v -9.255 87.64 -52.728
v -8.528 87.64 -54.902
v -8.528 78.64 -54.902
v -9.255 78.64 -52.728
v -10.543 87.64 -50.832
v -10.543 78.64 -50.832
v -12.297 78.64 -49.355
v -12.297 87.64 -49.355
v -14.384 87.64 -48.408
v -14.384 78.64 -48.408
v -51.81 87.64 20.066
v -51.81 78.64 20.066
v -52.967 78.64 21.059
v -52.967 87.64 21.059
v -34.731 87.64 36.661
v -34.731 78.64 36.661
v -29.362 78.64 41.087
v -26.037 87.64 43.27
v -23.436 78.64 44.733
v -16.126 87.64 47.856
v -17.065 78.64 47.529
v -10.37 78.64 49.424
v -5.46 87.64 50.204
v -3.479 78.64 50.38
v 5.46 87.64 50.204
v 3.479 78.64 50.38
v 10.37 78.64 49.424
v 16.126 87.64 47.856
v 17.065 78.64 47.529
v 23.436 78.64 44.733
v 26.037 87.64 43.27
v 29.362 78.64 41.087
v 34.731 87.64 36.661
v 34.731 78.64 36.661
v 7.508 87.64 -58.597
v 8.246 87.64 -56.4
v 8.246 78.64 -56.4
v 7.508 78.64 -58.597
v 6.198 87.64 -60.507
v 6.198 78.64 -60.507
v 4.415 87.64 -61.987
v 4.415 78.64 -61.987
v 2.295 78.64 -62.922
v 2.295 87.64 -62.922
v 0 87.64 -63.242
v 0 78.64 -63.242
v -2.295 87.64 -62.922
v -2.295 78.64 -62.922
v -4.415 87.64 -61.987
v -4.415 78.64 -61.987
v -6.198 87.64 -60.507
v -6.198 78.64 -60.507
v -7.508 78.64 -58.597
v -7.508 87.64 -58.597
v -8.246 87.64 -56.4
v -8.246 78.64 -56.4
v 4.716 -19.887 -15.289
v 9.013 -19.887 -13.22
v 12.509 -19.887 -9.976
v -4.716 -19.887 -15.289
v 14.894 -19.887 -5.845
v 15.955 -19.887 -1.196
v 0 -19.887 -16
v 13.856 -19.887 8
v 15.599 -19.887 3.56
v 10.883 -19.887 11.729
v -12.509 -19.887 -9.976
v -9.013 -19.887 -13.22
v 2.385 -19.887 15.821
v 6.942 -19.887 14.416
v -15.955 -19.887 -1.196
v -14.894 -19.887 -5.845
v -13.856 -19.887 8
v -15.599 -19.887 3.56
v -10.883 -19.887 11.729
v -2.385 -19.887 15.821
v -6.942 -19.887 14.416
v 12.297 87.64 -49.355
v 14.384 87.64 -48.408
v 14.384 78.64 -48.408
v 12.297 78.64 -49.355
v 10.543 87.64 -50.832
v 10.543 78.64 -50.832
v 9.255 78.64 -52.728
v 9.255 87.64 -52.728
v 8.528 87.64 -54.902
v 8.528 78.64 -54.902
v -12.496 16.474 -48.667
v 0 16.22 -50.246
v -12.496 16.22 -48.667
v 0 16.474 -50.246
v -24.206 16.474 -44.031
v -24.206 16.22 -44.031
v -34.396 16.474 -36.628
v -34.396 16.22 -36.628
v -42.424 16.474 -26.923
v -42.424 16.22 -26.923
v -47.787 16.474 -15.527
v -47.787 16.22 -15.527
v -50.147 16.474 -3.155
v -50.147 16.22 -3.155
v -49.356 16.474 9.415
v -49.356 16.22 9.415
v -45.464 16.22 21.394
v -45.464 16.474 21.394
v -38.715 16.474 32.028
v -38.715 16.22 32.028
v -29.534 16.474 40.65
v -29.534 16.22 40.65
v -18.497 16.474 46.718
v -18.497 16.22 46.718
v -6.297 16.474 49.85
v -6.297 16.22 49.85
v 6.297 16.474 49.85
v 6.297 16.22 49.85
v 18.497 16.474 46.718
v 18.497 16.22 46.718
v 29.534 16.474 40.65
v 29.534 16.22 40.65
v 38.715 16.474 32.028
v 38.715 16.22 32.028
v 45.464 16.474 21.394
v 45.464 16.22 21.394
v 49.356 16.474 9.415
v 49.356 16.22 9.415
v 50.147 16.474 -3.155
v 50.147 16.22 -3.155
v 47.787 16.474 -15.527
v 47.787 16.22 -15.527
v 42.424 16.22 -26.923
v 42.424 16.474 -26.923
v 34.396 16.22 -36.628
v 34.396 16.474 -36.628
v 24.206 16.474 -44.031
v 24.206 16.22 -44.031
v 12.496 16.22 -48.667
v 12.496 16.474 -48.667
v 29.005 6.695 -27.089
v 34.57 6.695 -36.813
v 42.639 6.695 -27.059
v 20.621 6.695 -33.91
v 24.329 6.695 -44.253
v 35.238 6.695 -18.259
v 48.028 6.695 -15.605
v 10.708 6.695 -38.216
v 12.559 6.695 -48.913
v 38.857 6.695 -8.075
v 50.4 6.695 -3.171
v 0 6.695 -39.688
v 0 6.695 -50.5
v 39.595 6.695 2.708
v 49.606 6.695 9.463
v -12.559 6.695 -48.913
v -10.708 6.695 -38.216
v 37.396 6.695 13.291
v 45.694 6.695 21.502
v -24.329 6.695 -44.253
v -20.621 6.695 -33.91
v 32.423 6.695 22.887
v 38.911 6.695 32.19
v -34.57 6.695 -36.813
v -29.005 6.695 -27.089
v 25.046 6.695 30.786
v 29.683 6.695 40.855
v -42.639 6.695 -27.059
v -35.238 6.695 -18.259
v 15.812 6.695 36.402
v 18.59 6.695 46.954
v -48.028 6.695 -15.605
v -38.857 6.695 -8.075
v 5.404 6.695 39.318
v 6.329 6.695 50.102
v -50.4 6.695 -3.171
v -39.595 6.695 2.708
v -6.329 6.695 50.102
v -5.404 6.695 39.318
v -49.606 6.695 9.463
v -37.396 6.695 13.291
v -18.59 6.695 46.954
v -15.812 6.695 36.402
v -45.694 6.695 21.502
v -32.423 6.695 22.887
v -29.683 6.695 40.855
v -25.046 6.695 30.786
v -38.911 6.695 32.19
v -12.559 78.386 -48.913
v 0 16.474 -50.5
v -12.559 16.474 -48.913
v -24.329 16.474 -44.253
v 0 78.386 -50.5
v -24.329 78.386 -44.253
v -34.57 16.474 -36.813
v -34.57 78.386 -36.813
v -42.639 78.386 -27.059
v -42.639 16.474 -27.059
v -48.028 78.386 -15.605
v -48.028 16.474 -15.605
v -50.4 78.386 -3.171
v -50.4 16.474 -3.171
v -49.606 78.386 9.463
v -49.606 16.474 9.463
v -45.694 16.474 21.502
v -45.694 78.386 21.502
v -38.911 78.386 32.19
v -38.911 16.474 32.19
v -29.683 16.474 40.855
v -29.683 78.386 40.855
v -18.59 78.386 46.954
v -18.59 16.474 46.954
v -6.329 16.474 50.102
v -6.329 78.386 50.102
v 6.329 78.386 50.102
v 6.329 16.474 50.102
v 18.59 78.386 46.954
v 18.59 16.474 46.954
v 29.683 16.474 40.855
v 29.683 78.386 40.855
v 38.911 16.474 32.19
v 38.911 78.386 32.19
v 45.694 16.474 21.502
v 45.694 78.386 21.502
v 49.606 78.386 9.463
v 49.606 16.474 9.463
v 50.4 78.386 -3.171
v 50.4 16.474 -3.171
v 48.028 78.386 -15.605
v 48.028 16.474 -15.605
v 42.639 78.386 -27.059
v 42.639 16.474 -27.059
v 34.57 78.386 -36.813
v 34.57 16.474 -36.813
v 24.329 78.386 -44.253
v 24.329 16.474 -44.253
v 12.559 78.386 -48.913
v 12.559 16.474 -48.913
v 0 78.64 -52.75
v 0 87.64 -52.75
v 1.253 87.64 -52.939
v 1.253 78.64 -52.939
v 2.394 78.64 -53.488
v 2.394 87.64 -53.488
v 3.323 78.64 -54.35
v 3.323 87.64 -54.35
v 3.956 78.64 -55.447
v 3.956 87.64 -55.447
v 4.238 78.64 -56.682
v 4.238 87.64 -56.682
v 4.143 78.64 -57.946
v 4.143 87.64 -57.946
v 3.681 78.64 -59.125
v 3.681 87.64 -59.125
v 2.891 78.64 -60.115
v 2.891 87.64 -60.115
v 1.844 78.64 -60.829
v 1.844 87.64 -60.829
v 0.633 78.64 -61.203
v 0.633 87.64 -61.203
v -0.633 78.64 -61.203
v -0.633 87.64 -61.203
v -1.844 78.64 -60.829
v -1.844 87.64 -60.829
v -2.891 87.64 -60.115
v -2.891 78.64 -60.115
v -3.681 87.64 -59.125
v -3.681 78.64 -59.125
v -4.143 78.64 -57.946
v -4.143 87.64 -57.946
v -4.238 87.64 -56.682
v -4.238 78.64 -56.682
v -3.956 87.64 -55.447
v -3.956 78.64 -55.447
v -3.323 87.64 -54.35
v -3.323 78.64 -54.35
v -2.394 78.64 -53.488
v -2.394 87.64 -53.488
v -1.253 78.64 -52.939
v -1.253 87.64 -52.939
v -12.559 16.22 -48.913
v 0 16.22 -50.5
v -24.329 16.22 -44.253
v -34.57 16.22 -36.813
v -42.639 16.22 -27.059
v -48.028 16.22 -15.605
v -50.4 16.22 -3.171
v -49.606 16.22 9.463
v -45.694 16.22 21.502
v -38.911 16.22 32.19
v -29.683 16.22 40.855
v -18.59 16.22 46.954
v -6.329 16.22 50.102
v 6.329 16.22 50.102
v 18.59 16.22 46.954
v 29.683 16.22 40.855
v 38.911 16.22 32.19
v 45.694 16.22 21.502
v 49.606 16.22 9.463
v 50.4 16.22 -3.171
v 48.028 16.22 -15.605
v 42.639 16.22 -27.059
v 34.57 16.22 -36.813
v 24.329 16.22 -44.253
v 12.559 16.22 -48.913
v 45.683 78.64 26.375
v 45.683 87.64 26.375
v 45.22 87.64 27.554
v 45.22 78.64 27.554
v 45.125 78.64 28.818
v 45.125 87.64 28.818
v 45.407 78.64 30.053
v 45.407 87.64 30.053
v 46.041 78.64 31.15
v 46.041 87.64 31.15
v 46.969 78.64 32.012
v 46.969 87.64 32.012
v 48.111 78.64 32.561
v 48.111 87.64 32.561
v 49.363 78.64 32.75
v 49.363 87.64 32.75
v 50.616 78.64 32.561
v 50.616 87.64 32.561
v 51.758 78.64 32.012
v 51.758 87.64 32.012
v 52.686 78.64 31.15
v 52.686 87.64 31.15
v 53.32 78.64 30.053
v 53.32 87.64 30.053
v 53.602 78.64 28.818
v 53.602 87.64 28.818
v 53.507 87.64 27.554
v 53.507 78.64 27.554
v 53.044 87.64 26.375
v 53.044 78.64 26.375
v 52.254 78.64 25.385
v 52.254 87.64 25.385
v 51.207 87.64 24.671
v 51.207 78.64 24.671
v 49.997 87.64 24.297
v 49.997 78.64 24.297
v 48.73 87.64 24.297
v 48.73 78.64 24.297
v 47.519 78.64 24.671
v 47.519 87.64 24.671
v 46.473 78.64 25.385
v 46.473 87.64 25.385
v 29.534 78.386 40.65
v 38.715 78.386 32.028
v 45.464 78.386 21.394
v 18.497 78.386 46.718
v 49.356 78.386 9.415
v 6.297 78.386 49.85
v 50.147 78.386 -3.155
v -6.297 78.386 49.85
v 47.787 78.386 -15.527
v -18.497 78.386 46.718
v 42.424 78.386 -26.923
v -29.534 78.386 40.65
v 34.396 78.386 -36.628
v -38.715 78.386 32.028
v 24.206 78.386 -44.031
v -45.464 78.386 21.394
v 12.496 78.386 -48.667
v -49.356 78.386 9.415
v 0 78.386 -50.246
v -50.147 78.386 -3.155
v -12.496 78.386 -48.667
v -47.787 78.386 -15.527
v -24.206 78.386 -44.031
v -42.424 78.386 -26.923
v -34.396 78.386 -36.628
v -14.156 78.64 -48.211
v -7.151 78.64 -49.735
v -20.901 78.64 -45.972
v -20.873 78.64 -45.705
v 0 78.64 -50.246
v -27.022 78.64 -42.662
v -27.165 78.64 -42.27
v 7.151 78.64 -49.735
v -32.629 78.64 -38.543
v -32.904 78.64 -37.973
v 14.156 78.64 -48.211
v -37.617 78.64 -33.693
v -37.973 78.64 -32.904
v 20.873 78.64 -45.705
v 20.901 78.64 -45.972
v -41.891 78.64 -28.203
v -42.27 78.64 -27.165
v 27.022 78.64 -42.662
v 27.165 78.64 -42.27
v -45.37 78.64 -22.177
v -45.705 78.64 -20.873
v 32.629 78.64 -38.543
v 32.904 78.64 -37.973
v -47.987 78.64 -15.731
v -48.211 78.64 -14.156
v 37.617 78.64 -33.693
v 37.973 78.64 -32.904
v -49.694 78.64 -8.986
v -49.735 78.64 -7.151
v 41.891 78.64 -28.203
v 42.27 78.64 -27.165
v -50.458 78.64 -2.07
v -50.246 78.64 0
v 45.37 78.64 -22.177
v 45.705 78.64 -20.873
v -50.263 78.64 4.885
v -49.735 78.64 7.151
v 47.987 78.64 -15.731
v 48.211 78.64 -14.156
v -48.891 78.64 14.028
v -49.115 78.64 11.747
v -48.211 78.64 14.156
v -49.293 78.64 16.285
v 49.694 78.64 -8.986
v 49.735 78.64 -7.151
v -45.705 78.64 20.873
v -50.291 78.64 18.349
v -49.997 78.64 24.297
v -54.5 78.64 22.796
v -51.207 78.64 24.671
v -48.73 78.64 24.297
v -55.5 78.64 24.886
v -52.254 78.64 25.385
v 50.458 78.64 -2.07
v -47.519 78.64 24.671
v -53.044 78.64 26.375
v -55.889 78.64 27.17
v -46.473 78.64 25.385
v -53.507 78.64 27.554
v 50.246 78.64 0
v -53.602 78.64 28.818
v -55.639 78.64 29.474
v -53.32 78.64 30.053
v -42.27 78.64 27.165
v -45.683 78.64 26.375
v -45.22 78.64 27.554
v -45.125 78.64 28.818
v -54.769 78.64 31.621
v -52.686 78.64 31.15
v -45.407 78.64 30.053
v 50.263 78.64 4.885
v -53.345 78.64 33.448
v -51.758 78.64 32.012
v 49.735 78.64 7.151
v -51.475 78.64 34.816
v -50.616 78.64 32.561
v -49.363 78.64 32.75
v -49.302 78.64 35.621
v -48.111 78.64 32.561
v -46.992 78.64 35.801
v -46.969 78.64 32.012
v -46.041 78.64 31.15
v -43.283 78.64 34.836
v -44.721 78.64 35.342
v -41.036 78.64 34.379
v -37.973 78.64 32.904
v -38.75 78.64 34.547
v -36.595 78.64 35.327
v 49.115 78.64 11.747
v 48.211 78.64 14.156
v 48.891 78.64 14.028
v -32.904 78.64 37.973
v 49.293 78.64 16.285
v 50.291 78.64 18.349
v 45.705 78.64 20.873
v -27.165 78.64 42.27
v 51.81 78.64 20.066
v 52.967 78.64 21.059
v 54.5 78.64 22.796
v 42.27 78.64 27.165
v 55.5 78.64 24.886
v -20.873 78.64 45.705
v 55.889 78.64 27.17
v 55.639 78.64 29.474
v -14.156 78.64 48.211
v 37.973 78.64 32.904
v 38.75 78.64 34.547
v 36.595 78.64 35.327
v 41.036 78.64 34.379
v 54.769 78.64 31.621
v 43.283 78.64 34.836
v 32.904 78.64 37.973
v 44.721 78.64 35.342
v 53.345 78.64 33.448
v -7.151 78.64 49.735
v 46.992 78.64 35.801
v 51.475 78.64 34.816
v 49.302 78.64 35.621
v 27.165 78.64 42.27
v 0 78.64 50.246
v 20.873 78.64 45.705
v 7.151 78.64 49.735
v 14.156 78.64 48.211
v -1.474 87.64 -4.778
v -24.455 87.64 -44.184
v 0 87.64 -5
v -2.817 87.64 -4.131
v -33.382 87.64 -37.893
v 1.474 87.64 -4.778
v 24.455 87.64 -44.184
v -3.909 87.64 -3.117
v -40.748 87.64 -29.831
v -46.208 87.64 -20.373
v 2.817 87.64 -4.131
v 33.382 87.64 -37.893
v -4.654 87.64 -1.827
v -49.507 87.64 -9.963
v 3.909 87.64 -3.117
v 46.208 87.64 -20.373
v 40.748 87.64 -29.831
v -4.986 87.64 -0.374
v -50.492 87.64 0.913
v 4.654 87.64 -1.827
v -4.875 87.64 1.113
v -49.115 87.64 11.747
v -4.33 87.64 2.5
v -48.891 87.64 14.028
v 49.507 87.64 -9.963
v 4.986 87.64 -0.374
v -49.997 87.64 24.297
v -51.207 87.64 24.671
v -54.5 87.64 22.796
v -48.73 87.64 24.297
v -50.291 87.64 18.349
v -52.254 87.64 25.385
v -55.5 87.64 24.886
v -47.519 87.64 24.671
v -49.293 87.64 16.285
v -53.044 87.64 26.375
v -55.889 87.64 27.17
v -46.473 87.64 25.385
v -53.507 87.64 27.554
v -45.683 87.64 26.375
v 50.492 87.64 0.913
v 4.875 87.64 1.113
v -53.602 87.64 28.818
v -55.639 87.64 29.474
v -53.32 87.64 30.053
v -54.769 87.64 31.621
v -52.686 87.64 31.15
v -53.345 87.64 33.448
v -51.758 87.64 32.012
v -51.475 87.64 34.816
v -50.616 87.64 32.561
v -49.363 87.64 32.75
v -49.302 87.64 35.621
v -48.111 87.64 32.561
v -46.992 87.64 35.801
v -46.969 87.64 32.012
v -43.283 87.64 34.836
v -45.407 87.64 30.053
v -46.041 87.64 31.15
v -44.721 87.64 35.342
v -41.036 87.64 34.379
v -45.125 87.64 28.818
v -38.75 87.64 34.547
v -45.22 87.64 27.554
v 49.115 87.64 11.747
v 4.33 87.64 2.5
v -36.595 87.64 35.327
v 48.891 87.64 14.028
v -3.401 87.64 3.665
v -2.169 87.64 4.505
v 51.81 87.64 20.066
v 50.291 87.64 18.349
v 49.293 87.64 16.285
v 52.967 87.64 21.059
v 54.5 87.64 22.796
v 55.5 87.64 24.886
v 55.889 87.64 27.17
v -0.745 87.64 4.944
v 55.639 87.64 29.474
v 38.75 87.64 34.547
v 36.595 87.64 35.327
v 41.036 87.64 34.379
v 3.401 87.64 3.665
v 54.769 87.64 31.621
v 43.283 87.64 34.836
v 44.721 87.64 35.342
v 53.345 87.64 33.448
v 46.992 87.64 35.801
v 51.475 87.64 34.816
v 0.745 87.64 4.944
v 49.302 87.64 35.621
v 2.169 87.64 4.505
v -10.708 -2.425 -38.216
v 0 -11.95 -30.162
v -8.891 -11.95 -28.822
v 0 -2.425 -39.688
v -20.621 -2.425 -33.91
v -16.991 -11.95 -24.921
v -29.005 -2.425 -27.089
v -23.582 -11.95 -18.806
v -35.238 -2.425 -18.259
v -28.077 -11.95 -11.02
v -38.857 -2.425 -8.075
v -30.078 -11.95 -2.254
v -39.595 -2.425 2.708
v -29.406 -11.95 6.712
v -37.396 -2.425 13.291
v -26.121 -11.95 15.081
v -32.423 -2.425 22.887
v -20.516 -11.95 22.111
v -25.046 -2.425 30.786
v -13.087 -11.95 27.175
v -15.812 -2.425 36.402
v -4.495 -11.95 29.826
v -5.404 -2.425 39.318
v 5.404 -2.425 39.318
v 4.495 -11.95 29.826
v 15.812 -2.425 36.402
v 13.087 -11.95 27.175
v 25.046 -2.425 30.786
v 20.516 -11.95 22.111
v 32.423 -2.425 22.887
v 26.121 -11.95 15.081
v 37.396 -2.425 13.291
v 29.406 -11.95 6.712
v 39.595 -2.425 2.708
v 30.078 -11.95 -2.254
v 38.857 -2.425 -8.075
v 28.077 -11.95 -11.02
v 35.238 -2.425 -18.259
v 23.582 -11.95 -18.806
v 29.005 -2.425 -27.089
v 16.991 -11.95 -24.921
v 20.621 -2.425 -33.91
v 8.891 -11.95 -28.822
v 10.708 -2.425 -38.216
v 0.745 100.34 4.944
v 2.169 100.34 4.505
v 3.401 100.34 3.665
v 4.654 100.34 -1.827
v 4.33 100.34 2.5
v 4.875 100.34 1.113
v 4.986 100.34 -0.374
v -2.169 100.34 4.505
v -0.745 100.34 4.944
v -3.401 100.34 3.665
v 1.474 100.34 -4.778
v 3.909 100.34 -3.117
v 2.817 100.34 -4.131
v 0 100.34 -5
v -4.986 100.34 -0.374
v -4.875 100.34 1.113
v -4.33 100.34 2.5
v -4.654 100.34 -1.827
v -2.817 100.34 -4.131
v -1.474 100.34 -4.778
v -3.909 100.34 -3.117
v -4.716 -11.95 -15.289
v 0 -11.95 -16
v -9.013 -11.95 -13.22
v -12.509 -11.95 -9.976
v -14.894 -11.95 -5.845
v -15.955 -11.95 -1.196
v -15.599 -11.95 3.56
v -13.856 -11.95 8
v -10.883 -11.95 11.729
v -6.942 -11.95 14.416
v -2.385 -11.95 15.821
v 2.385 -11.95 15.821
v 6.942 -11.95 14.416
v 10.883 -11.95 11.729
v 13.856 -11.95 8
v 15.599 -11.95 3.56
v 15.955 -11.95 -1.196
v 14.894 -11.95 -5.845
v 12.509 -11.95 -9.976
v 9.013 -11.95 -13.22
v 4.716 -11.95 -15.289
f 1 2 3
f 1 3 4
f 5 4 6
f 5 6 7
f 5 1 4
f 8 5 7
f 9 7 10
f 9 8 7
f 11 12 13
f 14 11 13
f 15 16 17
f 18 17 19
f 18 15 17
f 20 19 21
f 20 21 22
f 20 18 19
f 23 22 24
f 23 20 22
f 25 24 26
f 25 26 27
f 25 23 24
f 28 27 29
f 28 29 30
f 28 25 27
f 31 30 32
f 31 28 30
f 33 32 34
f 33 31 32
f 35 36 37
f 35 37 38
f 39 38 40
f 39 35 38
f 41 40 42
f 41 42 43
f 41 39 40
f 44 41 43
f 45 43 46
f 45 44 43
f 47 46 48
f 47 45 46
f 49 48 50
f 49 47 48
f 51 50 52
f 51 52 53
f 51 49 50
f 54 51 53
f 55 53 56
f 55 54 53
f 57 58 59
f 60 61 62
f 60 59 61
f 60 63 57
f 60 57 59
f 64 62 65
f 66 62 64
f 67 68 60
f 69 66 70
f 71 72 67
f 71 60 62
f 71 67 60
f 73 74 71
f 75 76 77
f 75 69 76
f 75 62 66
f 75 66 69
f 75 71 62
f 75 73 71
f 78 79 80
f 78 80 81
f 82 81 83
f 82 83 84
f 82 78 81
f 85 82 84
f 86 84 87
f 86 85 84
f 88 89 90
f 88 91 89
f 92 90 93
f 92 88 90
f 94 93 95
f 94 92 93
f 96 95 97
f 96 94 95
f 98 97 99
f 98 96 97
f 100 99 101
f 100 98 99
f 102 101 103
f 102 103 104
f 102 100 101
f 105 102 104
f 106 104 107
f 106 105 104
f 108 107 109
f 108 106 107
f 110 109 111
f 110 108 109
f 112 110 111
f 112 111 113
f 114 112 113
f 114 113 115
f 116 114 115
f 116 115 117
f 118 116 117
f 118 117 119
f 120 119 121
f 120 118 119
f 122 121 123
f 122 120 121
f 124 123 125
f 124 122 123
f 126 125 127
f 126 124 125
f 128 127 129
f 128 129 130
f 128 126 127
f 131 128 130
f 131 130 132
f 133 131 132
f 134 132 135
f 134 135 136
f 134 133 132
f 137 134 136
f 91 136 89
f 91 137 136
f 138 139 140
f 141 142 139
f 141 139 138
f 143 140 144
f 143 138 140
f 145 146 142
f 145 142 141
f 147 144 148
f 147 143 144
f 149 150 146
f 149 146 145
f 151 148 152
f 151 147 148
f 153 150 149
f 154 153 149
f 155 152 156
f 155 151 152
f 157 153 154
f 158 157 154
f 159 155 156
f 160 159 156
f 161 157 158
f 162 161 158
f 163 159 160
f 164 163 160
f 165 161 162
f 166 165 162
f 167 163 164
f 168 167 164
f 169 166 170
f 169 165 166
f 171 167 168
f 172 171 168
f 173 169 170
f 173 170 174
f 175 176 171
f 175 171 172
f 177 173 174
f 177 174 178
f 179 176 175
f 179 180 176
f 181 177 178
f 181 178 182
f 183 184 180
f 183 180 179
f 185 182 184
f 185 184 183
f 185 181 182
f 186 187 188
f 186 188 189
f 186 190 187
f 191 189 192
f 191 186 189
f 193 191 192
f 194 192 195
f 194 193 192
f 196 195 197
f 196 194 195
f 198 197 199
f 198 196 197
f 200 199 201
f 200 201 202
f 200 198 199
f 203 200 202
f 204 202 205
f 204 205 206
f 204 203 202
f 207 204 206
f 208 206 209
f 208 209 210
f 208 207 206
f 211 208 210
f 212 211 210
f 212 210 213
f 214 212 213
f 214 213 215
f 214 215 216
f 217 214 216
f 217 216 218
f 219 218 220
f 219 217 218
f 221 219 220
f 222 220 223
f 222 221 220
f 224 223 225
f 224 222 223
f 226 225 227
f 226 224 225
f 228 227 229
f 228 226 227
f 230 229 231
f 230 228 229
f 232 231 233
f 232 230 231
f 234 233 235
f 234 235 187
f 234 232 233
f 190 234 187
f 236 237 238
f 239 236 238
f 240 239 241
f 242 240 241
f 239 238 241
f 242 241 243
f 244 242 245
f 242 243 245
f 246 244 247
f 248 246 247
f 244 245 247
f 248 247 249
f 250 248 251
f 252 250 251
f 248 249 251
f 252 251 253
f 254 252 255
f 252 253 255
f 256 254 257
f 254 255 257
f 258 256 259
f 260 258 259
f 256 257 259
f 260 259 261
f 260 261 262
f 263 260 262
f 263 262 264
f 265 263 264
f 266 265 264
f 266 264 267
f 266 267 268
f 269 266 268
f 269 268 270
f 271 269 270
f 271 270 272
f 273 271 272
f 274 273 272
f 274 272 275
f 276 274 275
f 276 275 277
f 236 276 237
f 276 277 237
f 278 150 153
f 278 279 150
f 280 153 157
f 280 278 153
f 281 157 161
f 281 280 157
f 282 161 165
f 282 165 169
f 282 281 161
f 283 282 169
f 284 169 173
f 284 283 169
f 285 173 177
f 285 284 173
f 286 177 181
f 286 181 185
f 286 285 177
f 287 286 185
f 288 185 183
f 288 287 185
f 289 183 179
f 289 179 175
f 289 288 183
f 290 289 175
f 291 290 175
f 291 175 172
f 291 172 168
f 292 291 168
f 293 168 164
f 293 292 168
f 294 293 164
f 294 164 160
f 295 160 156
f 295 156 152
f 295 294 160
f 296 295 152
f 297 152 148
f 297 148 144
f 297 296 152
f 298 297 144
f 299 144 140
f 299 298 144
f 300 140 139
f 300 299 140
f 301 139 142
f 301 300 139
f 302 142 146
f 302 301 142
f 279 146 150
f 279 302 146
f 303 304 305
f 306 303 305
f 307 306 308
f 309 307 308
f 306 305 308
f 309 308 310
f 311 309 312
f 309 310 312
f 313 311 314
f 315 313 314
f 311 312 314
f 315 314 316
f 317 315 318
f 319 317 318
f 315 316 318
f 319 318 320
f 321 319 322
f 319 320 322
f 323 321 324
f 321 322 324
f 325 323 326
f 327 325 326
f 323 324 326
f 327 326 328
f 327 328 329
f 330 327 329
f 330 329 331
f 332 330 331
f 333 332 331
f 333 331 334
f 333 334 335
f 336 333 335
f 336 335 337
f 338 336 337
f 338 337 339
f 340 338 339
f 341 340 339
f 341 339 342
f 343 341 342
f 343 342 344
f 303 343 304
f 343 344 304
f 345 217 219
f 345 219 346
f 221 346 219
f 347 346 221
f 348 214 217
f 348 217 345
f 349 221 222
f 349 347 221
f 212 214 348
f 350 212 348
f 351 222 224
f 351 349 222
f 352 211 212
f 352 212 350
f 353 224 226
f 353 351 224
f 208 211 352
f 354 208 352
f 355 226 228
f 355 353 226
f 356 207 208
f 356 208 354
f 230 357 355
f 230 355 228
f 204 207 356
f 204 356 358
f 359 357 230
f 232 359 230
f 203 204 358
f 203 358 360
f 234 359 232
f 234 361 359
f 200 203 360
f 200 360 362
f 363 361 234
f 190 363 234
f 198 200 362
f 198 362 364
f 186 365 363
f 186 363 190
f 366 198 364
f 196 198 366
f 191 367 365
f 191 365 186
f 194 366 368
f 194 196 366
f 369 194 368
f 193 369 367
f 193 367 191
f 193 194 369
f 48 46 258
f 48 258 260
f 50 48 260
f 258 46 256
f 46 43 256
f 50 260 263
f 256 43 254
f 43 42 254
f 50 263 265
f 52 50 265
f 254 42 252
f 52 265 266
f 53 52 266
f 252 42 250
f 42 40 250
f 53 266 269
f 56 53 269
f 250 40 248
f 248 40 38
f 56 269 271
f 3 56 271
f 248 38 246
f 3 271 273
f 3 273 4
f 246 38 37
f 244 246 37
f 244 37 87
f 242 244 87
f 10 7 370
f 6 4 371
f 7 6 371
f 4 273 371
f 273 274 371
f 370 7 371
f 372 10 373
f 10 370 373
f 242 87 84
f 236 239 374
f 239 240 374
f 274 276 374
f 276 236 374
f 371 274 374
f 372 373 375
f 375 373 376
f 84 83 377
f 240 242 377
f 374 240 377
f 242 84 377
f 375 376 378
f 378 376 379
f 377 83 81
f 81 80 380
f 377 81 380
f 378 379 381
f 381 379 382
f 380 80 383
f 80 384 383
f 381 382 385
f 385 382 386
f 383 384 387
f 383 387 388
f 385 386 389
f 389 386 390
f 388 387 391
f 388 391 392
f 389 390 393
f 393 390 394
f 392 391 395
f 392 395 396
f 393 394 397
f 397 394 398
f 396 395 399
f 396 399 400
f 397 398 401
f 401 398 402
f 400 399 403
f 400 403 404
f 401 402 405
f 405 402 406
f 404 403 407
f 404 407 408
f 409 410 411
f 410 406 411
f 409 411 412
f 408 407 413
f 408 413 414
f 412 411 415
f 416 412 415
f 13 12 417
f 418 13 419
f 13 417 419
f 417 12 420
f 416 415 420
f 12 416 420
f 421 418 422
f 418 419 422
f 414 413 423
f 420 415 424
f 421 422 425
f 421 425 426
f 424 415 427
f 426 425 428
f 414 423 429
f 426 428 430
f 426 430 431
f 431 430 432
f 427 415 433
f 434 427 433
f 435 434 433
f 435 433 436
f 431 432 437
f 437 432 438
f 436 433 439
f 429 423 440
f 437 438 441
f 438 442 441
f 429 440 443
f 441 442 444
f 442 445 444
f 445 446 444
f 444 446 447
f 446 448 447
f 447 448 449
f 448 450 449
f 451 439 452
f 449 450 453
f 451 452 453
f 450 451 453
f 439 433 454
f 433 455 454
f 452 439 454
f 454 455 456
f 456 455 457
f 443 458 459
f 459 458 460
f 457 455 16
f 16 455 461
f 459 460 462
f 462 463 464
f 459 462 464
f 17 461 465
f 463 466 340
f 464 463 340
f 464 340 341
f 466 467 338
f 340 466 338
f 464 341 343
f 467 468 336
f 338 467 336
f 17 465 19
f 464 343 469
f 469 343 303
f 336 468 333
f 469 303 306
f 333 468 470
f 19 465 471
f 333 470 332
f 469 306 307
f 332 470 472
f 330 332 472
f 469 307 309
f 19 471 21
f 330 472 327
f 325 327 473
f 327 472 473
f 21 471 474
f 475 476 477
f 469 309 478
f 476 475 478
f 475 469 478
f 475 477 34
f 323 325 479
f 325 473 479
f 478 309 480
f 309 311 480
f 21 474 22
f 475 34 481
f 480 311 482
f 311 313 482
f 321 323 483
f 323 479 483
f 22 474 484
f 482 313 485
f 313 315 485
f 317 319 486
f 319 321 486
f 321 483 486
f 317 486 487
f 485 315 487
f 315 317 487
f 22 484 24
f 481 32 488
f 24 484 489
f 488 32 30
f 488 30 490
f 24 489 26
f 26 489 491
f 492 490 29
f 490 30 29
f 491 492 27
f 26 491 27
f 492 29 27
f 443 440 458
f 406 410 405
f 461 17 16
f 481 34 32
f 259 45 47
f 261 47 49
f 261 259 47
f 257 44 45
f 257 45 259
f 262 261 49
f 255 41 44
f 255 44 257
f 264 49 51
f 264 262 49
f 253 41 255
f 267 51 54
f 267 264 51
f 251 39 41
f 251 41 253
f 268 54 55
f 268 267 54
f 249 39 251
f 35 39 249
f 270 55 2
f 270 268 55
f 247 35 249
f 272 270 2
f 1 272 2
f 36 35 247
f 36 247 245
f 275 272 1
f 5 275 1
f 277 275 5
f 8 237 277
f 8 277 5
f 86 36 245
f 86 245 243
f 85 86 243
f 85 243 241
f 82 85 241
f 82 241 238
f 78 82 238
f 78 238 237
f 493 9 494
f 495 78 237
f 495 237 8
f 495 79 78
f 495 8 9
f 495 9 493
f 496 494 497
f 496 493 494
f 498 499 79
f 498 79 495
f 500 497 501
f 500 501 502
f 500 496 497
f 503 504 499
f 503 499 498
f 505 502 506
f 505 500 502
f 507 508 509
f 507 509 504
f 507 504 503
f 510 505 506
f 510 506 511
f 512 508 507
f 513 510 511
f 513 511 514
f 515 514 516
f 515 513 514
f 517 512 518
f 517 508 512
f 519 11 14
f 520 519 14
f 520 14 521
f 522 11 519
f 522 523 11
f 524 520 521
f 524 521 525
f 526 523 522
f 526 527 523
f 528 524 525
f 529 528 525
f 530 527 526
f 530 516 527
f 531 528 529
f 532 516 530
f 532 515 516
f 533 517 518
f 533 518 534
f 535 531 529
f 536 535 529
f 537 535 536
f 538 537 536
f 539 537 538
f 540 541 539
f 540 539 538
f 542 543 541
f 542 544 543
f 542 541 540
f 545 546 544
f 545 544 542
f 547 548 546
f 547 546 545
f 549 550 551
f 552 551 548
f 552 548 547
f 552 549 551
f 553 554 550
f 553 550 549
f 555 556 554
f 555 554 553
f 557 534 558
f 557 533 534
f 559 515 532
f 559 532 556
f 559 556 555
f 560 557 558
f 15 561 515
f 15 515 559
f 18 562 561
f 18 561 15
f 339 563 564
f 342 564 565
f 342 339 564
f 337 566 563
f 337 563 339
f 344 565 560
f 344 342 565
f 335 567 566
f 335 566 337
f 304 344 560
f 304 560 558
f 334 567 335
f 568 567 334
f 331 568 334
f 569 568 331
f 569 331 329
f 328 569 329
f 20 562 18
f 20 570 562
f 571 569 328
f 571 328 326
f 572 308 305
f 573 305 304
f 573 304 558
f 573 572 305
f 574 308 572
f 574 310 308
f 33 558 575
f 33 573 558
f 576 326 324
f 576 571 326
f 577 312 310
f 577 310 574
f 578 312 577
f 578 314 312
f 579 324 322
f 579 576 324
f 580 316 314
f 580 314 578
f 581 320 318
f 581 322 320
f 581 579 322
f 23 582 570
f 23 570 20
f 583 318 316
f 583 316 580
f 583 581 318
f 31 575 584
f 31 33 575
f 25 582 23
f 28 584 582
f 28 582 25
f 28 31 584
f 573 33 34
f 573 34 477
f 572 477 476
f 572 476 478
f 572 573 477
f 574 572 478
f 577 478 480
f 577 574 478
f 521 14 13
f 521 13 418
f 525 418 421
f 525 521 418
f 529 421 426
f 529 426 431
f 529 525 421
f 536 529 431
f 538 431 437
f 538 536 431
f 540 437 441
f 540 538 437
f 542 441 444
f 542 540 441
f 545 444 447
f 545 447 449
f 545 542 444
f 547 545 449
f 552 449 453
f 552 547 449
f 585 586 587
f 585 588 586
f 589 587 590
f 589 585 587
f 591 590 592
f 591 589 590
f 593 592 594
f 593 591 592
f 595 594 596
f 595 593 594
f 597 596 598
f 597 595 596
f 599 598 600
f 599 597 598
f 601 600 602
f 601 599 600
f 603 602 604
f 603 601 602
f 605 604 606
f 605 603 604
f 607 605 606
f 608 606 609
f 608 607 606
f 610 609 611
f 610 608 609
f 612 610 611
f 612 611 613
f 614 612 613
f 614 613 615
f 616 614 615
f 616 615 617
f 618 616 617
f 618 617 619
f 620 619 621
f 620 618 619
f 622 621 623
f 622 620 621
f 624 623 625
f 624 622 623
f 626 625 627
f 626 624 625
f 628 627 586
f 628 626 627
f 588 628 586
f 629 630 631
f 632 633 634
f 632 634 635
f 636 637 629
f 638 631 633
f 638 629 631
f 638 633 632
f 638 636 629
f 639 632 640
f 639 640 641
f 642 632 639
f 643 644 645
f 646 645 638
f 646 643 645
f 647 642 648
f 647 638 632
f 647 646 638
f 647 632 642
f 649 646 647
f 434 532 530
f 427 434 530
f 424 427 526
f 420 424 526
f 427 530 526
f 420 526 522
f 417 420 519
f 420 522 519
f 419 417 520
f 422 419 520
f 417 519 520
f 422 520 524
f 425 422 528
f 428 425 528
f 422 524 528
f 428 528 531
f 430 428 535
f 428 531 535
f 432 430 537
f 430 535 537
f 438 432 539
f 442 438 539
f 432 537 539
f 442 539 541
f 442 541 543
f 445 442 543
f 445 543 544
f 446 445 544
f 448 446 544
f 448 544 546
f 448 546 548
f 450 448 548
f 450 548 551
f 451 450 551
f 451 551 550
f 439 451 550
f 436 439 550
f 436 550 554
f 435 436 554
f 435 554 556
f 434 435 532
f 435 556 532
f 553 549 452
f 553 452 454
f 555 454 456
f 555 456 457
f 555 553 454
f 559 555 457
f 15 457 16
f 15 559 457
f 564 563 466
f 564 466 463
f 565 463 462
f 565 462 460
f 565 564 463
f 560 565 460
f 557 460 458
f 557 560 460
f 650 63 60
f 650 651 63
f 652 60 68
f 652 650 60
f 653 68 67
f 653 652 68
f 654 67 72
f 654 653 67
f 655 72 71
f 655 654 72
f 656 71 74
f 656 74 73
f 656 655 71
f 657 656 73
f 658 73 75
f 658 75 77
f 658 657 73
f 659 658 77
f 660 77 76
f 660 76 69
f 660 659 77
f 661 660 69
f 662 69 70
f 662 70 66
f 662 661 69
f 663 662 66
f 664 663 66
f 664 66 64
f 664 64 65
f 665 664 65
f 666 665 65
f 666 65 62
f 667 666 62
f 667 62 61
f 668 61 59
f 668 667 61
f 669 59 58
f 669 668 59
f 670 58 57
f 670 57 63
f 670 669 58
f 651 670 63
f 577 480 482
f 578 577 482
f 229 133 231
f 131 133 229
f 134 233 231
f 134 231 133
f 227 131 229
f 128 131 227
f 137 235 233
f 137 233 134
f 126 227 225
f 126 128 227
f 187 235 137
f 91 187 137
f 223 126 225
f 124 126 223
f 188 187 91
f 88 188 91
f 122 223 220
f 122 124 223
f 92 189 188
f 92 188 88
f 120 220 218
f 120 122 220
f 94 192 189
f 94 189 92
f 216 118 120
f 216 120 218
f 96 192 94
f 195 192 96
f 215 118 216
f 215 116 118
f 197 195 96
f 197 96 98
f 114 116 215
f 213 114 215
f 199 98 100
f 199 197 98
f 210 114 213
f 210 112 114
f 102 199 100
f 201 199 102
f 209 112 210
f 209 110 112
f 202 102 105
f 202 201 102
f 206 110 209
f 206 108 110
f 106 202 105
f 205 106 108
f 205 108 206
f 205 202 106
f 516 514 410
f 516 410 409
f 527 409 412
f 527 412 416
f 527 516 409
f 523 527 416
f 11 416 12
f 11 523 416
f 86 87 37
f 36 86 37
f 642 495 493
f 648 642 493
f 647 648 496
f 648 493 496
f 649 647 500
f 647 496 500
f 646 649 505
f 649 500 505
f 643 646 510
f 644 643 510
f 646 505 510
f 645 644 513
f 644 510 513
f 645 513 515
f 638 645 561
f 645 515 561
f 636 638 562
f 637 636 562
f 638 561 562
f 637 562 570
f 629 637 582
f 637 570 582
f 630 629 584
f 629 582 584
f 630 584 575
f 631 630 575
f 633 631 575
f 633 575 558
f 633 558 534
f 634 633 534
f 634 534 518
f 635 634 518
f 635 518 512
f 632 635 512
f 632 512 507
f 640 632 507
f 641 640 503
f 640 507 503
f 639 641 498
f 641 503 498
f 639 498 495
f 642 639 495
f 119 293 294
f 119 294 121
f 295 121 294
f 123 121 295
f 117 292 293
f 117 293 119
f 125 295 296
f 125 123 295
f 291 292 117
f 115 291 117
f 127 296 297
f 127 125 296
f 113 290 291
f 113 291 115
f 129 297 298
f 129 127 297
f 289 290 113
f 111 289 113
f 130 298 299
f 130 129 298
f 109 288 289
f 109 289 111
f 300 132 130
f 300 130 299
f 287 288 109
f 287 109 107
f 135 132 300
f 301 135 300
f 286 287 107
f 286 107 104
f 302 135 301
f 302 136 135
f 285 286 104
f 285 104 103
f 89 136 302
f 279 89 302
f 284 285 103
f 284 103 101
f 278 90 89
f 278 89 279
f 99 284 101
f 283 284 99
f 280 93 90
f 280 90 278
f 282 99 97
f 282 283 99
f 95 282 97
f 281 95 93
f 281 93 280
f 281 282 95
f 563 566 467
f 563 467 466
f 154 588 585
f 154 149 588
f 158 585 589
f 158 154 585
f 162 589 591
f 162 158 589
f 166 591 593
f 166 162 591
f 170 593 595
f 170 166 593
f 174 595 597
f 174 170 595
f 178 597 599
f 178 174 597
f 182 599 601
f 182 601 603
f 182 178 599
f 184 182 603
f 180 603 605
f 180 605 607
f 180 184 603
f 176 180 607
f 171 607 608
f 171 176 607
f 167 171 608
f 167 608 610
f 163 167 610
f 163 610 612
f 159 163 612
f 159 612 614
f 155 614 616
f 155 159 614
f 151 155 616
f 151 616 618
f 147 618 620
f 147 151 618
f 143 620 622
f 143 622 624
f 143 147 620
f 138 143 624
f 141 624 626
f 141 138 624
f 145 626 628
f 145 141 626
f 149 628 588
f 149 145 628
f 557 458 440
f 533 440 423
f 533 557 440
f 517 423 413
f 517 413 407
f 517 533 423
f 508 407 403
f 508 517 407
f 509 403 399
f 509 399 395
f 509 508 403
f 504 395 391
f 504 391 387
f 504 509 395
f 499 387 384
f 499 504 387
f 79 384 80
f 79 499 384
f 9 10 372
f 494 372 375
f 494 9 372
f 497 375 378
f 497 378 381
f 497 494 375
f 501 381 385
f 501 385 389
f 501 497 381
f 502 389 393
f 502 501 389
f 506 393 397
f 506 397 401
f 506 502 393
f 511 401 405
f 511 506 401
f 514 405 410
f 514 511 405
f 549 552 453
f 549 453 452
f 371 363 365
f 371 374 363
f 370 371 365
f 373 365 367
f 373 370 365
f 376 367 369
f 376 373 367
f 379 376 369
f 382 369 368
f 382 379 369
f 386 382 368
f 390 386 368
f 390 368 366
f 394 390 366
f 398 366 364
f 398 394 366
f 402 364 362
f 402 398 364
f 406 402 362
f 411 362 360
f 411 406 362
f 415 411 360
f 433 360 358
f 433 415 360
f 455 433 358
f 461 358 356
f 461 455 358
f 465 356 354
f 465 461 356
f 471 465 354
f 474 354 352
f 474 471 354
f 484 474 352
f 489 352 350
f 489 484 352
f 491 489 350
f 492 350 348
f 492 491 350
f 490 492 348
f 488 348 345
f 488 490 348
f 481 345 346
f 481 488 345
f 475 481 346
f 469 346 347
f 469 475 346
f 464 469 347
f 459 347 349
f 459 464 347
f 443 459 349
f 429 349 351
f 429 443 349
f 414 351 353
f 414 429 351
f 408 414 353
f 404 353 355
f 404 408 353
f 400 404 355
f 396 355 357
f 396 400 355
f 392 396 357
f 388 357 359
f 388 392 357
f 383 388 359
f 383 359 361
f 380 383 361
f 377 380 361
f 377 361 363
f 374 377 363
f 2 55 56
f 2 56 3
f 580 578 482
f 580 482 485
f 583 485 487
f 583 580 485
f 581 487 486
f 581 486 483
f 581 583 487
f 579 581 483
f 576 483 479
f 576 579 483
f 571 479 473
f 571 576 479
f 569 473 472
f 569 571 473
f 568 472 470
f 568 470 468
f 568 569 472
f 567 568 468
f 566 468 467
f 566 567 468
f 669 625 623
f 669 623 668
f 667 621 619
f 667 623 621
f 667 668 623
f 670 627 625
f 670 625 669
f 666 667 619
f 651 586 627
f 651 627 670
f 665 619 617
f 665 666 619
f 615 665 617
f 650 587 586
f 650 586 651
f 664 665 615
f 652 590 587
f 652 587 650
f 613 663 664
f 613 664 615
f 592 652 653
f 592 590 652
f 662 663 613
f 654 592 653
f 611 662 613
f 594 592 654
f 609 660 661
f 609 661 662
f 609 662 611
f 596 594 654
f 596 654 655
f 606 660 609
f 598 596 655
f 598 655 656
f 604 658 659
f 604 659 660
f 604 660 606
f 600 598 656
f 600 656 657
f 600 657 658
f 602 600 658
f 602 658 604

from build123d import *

# Parameters (mm, degrees)
BOSS_EXTRUDE1_START = 9
SKETCH3_R           = 4.25
BOSS_EXTRUDE1_DEPTH = 9
CIRPATTERN1_COUNT   = 3
SKETCH4_R           = 5
BOSS_EXTRUDE2_DEPTH = 12.7


with BuildPart() as part:
    # Sketch1 → Revolve1 (revolve)
    with BuildSketch(Plane.XY):
        Polygon((0, 78.640438678), (0, -19.887292524), (16, -19.887292524), (16, -11.949792524), (30.1625, -11.949792524), (39.6875, -2.424792524), (39.6875, 6.694938678), (50.5, 6.694938678), (50.5, 16.219938678), (50.246, 16.219938678), (50.246, 16.473938678), (50.5, 16.473938678), (50.5, 78.386438678), (50.246, 78.386438678), (50.246, 78.640438678), align=None)
    revolve(axis=Axis((0, -28.529868613, 0), (0, 1, 0)))

    # Sketch3 → Boss-Extrude1 (add)
    with BuildSketch(Plane(origin=(0, 78.640438678, 0), x_dir=(1, 0, 0), z_dir=(0, 1, 0)).offset(BOSS_EXTRUDE1_START)):
        with BuildLine():
            Line((-8.246317561, 56.400339065), (-8.527789484, 54.9019935))
            ThreePointArc((-8.527789484, 54.9019935), (-10.543132136, 50.831813425), (-14.384179724, 48.408112685))
            ThreePointArc((-14.384179724, 48.408112685), (0, -50.5), (14.384179724, 48.408112685))
            ThreePointArc((14.384179724, 48.408112685), (10.543132136, 50.831813425), (8.527789484, 54.9019935))
            Line((8.527789484, 54.9019935), (8.246317561, 56.400339065))
            ThreePointArc((8.246317561, 56.400339065), (0, 63.241786356), (-8.246317561, 56.400339065))
        make_face()
        with Locations((0, 57)):
            Circle(SKETCH3_R, mode=Mode.SUBTRACT)
    boss_extrude1 = extrude(amount=-BOSS_EXTRUDE1_DEPTH)

    # CirPattern1: Boss-Extrude1 ×3 about axis
    cirpattern1_axis = Axis((0, 87.640438678, 0), (0, -1, 0))
    for i in range(1, CIRPATTERN1_COUNT):
        add(boss_extrude1.rotate(cirpattern1_axis, i * 360 / CIRPATTERN1_COUNT))

    # Sketch4 → Boss-Extrude2 (add)
    with BuildSketch(Plane(origin=(0, 87.640438678, 0), x_dir=(1, 0, 0), z_dir=(0, 1, 0))):
        Circle(SKETCH4_R)
    extrude(amount=BOSS_EXTRUDE2_DEPTH)


solid = part.part
